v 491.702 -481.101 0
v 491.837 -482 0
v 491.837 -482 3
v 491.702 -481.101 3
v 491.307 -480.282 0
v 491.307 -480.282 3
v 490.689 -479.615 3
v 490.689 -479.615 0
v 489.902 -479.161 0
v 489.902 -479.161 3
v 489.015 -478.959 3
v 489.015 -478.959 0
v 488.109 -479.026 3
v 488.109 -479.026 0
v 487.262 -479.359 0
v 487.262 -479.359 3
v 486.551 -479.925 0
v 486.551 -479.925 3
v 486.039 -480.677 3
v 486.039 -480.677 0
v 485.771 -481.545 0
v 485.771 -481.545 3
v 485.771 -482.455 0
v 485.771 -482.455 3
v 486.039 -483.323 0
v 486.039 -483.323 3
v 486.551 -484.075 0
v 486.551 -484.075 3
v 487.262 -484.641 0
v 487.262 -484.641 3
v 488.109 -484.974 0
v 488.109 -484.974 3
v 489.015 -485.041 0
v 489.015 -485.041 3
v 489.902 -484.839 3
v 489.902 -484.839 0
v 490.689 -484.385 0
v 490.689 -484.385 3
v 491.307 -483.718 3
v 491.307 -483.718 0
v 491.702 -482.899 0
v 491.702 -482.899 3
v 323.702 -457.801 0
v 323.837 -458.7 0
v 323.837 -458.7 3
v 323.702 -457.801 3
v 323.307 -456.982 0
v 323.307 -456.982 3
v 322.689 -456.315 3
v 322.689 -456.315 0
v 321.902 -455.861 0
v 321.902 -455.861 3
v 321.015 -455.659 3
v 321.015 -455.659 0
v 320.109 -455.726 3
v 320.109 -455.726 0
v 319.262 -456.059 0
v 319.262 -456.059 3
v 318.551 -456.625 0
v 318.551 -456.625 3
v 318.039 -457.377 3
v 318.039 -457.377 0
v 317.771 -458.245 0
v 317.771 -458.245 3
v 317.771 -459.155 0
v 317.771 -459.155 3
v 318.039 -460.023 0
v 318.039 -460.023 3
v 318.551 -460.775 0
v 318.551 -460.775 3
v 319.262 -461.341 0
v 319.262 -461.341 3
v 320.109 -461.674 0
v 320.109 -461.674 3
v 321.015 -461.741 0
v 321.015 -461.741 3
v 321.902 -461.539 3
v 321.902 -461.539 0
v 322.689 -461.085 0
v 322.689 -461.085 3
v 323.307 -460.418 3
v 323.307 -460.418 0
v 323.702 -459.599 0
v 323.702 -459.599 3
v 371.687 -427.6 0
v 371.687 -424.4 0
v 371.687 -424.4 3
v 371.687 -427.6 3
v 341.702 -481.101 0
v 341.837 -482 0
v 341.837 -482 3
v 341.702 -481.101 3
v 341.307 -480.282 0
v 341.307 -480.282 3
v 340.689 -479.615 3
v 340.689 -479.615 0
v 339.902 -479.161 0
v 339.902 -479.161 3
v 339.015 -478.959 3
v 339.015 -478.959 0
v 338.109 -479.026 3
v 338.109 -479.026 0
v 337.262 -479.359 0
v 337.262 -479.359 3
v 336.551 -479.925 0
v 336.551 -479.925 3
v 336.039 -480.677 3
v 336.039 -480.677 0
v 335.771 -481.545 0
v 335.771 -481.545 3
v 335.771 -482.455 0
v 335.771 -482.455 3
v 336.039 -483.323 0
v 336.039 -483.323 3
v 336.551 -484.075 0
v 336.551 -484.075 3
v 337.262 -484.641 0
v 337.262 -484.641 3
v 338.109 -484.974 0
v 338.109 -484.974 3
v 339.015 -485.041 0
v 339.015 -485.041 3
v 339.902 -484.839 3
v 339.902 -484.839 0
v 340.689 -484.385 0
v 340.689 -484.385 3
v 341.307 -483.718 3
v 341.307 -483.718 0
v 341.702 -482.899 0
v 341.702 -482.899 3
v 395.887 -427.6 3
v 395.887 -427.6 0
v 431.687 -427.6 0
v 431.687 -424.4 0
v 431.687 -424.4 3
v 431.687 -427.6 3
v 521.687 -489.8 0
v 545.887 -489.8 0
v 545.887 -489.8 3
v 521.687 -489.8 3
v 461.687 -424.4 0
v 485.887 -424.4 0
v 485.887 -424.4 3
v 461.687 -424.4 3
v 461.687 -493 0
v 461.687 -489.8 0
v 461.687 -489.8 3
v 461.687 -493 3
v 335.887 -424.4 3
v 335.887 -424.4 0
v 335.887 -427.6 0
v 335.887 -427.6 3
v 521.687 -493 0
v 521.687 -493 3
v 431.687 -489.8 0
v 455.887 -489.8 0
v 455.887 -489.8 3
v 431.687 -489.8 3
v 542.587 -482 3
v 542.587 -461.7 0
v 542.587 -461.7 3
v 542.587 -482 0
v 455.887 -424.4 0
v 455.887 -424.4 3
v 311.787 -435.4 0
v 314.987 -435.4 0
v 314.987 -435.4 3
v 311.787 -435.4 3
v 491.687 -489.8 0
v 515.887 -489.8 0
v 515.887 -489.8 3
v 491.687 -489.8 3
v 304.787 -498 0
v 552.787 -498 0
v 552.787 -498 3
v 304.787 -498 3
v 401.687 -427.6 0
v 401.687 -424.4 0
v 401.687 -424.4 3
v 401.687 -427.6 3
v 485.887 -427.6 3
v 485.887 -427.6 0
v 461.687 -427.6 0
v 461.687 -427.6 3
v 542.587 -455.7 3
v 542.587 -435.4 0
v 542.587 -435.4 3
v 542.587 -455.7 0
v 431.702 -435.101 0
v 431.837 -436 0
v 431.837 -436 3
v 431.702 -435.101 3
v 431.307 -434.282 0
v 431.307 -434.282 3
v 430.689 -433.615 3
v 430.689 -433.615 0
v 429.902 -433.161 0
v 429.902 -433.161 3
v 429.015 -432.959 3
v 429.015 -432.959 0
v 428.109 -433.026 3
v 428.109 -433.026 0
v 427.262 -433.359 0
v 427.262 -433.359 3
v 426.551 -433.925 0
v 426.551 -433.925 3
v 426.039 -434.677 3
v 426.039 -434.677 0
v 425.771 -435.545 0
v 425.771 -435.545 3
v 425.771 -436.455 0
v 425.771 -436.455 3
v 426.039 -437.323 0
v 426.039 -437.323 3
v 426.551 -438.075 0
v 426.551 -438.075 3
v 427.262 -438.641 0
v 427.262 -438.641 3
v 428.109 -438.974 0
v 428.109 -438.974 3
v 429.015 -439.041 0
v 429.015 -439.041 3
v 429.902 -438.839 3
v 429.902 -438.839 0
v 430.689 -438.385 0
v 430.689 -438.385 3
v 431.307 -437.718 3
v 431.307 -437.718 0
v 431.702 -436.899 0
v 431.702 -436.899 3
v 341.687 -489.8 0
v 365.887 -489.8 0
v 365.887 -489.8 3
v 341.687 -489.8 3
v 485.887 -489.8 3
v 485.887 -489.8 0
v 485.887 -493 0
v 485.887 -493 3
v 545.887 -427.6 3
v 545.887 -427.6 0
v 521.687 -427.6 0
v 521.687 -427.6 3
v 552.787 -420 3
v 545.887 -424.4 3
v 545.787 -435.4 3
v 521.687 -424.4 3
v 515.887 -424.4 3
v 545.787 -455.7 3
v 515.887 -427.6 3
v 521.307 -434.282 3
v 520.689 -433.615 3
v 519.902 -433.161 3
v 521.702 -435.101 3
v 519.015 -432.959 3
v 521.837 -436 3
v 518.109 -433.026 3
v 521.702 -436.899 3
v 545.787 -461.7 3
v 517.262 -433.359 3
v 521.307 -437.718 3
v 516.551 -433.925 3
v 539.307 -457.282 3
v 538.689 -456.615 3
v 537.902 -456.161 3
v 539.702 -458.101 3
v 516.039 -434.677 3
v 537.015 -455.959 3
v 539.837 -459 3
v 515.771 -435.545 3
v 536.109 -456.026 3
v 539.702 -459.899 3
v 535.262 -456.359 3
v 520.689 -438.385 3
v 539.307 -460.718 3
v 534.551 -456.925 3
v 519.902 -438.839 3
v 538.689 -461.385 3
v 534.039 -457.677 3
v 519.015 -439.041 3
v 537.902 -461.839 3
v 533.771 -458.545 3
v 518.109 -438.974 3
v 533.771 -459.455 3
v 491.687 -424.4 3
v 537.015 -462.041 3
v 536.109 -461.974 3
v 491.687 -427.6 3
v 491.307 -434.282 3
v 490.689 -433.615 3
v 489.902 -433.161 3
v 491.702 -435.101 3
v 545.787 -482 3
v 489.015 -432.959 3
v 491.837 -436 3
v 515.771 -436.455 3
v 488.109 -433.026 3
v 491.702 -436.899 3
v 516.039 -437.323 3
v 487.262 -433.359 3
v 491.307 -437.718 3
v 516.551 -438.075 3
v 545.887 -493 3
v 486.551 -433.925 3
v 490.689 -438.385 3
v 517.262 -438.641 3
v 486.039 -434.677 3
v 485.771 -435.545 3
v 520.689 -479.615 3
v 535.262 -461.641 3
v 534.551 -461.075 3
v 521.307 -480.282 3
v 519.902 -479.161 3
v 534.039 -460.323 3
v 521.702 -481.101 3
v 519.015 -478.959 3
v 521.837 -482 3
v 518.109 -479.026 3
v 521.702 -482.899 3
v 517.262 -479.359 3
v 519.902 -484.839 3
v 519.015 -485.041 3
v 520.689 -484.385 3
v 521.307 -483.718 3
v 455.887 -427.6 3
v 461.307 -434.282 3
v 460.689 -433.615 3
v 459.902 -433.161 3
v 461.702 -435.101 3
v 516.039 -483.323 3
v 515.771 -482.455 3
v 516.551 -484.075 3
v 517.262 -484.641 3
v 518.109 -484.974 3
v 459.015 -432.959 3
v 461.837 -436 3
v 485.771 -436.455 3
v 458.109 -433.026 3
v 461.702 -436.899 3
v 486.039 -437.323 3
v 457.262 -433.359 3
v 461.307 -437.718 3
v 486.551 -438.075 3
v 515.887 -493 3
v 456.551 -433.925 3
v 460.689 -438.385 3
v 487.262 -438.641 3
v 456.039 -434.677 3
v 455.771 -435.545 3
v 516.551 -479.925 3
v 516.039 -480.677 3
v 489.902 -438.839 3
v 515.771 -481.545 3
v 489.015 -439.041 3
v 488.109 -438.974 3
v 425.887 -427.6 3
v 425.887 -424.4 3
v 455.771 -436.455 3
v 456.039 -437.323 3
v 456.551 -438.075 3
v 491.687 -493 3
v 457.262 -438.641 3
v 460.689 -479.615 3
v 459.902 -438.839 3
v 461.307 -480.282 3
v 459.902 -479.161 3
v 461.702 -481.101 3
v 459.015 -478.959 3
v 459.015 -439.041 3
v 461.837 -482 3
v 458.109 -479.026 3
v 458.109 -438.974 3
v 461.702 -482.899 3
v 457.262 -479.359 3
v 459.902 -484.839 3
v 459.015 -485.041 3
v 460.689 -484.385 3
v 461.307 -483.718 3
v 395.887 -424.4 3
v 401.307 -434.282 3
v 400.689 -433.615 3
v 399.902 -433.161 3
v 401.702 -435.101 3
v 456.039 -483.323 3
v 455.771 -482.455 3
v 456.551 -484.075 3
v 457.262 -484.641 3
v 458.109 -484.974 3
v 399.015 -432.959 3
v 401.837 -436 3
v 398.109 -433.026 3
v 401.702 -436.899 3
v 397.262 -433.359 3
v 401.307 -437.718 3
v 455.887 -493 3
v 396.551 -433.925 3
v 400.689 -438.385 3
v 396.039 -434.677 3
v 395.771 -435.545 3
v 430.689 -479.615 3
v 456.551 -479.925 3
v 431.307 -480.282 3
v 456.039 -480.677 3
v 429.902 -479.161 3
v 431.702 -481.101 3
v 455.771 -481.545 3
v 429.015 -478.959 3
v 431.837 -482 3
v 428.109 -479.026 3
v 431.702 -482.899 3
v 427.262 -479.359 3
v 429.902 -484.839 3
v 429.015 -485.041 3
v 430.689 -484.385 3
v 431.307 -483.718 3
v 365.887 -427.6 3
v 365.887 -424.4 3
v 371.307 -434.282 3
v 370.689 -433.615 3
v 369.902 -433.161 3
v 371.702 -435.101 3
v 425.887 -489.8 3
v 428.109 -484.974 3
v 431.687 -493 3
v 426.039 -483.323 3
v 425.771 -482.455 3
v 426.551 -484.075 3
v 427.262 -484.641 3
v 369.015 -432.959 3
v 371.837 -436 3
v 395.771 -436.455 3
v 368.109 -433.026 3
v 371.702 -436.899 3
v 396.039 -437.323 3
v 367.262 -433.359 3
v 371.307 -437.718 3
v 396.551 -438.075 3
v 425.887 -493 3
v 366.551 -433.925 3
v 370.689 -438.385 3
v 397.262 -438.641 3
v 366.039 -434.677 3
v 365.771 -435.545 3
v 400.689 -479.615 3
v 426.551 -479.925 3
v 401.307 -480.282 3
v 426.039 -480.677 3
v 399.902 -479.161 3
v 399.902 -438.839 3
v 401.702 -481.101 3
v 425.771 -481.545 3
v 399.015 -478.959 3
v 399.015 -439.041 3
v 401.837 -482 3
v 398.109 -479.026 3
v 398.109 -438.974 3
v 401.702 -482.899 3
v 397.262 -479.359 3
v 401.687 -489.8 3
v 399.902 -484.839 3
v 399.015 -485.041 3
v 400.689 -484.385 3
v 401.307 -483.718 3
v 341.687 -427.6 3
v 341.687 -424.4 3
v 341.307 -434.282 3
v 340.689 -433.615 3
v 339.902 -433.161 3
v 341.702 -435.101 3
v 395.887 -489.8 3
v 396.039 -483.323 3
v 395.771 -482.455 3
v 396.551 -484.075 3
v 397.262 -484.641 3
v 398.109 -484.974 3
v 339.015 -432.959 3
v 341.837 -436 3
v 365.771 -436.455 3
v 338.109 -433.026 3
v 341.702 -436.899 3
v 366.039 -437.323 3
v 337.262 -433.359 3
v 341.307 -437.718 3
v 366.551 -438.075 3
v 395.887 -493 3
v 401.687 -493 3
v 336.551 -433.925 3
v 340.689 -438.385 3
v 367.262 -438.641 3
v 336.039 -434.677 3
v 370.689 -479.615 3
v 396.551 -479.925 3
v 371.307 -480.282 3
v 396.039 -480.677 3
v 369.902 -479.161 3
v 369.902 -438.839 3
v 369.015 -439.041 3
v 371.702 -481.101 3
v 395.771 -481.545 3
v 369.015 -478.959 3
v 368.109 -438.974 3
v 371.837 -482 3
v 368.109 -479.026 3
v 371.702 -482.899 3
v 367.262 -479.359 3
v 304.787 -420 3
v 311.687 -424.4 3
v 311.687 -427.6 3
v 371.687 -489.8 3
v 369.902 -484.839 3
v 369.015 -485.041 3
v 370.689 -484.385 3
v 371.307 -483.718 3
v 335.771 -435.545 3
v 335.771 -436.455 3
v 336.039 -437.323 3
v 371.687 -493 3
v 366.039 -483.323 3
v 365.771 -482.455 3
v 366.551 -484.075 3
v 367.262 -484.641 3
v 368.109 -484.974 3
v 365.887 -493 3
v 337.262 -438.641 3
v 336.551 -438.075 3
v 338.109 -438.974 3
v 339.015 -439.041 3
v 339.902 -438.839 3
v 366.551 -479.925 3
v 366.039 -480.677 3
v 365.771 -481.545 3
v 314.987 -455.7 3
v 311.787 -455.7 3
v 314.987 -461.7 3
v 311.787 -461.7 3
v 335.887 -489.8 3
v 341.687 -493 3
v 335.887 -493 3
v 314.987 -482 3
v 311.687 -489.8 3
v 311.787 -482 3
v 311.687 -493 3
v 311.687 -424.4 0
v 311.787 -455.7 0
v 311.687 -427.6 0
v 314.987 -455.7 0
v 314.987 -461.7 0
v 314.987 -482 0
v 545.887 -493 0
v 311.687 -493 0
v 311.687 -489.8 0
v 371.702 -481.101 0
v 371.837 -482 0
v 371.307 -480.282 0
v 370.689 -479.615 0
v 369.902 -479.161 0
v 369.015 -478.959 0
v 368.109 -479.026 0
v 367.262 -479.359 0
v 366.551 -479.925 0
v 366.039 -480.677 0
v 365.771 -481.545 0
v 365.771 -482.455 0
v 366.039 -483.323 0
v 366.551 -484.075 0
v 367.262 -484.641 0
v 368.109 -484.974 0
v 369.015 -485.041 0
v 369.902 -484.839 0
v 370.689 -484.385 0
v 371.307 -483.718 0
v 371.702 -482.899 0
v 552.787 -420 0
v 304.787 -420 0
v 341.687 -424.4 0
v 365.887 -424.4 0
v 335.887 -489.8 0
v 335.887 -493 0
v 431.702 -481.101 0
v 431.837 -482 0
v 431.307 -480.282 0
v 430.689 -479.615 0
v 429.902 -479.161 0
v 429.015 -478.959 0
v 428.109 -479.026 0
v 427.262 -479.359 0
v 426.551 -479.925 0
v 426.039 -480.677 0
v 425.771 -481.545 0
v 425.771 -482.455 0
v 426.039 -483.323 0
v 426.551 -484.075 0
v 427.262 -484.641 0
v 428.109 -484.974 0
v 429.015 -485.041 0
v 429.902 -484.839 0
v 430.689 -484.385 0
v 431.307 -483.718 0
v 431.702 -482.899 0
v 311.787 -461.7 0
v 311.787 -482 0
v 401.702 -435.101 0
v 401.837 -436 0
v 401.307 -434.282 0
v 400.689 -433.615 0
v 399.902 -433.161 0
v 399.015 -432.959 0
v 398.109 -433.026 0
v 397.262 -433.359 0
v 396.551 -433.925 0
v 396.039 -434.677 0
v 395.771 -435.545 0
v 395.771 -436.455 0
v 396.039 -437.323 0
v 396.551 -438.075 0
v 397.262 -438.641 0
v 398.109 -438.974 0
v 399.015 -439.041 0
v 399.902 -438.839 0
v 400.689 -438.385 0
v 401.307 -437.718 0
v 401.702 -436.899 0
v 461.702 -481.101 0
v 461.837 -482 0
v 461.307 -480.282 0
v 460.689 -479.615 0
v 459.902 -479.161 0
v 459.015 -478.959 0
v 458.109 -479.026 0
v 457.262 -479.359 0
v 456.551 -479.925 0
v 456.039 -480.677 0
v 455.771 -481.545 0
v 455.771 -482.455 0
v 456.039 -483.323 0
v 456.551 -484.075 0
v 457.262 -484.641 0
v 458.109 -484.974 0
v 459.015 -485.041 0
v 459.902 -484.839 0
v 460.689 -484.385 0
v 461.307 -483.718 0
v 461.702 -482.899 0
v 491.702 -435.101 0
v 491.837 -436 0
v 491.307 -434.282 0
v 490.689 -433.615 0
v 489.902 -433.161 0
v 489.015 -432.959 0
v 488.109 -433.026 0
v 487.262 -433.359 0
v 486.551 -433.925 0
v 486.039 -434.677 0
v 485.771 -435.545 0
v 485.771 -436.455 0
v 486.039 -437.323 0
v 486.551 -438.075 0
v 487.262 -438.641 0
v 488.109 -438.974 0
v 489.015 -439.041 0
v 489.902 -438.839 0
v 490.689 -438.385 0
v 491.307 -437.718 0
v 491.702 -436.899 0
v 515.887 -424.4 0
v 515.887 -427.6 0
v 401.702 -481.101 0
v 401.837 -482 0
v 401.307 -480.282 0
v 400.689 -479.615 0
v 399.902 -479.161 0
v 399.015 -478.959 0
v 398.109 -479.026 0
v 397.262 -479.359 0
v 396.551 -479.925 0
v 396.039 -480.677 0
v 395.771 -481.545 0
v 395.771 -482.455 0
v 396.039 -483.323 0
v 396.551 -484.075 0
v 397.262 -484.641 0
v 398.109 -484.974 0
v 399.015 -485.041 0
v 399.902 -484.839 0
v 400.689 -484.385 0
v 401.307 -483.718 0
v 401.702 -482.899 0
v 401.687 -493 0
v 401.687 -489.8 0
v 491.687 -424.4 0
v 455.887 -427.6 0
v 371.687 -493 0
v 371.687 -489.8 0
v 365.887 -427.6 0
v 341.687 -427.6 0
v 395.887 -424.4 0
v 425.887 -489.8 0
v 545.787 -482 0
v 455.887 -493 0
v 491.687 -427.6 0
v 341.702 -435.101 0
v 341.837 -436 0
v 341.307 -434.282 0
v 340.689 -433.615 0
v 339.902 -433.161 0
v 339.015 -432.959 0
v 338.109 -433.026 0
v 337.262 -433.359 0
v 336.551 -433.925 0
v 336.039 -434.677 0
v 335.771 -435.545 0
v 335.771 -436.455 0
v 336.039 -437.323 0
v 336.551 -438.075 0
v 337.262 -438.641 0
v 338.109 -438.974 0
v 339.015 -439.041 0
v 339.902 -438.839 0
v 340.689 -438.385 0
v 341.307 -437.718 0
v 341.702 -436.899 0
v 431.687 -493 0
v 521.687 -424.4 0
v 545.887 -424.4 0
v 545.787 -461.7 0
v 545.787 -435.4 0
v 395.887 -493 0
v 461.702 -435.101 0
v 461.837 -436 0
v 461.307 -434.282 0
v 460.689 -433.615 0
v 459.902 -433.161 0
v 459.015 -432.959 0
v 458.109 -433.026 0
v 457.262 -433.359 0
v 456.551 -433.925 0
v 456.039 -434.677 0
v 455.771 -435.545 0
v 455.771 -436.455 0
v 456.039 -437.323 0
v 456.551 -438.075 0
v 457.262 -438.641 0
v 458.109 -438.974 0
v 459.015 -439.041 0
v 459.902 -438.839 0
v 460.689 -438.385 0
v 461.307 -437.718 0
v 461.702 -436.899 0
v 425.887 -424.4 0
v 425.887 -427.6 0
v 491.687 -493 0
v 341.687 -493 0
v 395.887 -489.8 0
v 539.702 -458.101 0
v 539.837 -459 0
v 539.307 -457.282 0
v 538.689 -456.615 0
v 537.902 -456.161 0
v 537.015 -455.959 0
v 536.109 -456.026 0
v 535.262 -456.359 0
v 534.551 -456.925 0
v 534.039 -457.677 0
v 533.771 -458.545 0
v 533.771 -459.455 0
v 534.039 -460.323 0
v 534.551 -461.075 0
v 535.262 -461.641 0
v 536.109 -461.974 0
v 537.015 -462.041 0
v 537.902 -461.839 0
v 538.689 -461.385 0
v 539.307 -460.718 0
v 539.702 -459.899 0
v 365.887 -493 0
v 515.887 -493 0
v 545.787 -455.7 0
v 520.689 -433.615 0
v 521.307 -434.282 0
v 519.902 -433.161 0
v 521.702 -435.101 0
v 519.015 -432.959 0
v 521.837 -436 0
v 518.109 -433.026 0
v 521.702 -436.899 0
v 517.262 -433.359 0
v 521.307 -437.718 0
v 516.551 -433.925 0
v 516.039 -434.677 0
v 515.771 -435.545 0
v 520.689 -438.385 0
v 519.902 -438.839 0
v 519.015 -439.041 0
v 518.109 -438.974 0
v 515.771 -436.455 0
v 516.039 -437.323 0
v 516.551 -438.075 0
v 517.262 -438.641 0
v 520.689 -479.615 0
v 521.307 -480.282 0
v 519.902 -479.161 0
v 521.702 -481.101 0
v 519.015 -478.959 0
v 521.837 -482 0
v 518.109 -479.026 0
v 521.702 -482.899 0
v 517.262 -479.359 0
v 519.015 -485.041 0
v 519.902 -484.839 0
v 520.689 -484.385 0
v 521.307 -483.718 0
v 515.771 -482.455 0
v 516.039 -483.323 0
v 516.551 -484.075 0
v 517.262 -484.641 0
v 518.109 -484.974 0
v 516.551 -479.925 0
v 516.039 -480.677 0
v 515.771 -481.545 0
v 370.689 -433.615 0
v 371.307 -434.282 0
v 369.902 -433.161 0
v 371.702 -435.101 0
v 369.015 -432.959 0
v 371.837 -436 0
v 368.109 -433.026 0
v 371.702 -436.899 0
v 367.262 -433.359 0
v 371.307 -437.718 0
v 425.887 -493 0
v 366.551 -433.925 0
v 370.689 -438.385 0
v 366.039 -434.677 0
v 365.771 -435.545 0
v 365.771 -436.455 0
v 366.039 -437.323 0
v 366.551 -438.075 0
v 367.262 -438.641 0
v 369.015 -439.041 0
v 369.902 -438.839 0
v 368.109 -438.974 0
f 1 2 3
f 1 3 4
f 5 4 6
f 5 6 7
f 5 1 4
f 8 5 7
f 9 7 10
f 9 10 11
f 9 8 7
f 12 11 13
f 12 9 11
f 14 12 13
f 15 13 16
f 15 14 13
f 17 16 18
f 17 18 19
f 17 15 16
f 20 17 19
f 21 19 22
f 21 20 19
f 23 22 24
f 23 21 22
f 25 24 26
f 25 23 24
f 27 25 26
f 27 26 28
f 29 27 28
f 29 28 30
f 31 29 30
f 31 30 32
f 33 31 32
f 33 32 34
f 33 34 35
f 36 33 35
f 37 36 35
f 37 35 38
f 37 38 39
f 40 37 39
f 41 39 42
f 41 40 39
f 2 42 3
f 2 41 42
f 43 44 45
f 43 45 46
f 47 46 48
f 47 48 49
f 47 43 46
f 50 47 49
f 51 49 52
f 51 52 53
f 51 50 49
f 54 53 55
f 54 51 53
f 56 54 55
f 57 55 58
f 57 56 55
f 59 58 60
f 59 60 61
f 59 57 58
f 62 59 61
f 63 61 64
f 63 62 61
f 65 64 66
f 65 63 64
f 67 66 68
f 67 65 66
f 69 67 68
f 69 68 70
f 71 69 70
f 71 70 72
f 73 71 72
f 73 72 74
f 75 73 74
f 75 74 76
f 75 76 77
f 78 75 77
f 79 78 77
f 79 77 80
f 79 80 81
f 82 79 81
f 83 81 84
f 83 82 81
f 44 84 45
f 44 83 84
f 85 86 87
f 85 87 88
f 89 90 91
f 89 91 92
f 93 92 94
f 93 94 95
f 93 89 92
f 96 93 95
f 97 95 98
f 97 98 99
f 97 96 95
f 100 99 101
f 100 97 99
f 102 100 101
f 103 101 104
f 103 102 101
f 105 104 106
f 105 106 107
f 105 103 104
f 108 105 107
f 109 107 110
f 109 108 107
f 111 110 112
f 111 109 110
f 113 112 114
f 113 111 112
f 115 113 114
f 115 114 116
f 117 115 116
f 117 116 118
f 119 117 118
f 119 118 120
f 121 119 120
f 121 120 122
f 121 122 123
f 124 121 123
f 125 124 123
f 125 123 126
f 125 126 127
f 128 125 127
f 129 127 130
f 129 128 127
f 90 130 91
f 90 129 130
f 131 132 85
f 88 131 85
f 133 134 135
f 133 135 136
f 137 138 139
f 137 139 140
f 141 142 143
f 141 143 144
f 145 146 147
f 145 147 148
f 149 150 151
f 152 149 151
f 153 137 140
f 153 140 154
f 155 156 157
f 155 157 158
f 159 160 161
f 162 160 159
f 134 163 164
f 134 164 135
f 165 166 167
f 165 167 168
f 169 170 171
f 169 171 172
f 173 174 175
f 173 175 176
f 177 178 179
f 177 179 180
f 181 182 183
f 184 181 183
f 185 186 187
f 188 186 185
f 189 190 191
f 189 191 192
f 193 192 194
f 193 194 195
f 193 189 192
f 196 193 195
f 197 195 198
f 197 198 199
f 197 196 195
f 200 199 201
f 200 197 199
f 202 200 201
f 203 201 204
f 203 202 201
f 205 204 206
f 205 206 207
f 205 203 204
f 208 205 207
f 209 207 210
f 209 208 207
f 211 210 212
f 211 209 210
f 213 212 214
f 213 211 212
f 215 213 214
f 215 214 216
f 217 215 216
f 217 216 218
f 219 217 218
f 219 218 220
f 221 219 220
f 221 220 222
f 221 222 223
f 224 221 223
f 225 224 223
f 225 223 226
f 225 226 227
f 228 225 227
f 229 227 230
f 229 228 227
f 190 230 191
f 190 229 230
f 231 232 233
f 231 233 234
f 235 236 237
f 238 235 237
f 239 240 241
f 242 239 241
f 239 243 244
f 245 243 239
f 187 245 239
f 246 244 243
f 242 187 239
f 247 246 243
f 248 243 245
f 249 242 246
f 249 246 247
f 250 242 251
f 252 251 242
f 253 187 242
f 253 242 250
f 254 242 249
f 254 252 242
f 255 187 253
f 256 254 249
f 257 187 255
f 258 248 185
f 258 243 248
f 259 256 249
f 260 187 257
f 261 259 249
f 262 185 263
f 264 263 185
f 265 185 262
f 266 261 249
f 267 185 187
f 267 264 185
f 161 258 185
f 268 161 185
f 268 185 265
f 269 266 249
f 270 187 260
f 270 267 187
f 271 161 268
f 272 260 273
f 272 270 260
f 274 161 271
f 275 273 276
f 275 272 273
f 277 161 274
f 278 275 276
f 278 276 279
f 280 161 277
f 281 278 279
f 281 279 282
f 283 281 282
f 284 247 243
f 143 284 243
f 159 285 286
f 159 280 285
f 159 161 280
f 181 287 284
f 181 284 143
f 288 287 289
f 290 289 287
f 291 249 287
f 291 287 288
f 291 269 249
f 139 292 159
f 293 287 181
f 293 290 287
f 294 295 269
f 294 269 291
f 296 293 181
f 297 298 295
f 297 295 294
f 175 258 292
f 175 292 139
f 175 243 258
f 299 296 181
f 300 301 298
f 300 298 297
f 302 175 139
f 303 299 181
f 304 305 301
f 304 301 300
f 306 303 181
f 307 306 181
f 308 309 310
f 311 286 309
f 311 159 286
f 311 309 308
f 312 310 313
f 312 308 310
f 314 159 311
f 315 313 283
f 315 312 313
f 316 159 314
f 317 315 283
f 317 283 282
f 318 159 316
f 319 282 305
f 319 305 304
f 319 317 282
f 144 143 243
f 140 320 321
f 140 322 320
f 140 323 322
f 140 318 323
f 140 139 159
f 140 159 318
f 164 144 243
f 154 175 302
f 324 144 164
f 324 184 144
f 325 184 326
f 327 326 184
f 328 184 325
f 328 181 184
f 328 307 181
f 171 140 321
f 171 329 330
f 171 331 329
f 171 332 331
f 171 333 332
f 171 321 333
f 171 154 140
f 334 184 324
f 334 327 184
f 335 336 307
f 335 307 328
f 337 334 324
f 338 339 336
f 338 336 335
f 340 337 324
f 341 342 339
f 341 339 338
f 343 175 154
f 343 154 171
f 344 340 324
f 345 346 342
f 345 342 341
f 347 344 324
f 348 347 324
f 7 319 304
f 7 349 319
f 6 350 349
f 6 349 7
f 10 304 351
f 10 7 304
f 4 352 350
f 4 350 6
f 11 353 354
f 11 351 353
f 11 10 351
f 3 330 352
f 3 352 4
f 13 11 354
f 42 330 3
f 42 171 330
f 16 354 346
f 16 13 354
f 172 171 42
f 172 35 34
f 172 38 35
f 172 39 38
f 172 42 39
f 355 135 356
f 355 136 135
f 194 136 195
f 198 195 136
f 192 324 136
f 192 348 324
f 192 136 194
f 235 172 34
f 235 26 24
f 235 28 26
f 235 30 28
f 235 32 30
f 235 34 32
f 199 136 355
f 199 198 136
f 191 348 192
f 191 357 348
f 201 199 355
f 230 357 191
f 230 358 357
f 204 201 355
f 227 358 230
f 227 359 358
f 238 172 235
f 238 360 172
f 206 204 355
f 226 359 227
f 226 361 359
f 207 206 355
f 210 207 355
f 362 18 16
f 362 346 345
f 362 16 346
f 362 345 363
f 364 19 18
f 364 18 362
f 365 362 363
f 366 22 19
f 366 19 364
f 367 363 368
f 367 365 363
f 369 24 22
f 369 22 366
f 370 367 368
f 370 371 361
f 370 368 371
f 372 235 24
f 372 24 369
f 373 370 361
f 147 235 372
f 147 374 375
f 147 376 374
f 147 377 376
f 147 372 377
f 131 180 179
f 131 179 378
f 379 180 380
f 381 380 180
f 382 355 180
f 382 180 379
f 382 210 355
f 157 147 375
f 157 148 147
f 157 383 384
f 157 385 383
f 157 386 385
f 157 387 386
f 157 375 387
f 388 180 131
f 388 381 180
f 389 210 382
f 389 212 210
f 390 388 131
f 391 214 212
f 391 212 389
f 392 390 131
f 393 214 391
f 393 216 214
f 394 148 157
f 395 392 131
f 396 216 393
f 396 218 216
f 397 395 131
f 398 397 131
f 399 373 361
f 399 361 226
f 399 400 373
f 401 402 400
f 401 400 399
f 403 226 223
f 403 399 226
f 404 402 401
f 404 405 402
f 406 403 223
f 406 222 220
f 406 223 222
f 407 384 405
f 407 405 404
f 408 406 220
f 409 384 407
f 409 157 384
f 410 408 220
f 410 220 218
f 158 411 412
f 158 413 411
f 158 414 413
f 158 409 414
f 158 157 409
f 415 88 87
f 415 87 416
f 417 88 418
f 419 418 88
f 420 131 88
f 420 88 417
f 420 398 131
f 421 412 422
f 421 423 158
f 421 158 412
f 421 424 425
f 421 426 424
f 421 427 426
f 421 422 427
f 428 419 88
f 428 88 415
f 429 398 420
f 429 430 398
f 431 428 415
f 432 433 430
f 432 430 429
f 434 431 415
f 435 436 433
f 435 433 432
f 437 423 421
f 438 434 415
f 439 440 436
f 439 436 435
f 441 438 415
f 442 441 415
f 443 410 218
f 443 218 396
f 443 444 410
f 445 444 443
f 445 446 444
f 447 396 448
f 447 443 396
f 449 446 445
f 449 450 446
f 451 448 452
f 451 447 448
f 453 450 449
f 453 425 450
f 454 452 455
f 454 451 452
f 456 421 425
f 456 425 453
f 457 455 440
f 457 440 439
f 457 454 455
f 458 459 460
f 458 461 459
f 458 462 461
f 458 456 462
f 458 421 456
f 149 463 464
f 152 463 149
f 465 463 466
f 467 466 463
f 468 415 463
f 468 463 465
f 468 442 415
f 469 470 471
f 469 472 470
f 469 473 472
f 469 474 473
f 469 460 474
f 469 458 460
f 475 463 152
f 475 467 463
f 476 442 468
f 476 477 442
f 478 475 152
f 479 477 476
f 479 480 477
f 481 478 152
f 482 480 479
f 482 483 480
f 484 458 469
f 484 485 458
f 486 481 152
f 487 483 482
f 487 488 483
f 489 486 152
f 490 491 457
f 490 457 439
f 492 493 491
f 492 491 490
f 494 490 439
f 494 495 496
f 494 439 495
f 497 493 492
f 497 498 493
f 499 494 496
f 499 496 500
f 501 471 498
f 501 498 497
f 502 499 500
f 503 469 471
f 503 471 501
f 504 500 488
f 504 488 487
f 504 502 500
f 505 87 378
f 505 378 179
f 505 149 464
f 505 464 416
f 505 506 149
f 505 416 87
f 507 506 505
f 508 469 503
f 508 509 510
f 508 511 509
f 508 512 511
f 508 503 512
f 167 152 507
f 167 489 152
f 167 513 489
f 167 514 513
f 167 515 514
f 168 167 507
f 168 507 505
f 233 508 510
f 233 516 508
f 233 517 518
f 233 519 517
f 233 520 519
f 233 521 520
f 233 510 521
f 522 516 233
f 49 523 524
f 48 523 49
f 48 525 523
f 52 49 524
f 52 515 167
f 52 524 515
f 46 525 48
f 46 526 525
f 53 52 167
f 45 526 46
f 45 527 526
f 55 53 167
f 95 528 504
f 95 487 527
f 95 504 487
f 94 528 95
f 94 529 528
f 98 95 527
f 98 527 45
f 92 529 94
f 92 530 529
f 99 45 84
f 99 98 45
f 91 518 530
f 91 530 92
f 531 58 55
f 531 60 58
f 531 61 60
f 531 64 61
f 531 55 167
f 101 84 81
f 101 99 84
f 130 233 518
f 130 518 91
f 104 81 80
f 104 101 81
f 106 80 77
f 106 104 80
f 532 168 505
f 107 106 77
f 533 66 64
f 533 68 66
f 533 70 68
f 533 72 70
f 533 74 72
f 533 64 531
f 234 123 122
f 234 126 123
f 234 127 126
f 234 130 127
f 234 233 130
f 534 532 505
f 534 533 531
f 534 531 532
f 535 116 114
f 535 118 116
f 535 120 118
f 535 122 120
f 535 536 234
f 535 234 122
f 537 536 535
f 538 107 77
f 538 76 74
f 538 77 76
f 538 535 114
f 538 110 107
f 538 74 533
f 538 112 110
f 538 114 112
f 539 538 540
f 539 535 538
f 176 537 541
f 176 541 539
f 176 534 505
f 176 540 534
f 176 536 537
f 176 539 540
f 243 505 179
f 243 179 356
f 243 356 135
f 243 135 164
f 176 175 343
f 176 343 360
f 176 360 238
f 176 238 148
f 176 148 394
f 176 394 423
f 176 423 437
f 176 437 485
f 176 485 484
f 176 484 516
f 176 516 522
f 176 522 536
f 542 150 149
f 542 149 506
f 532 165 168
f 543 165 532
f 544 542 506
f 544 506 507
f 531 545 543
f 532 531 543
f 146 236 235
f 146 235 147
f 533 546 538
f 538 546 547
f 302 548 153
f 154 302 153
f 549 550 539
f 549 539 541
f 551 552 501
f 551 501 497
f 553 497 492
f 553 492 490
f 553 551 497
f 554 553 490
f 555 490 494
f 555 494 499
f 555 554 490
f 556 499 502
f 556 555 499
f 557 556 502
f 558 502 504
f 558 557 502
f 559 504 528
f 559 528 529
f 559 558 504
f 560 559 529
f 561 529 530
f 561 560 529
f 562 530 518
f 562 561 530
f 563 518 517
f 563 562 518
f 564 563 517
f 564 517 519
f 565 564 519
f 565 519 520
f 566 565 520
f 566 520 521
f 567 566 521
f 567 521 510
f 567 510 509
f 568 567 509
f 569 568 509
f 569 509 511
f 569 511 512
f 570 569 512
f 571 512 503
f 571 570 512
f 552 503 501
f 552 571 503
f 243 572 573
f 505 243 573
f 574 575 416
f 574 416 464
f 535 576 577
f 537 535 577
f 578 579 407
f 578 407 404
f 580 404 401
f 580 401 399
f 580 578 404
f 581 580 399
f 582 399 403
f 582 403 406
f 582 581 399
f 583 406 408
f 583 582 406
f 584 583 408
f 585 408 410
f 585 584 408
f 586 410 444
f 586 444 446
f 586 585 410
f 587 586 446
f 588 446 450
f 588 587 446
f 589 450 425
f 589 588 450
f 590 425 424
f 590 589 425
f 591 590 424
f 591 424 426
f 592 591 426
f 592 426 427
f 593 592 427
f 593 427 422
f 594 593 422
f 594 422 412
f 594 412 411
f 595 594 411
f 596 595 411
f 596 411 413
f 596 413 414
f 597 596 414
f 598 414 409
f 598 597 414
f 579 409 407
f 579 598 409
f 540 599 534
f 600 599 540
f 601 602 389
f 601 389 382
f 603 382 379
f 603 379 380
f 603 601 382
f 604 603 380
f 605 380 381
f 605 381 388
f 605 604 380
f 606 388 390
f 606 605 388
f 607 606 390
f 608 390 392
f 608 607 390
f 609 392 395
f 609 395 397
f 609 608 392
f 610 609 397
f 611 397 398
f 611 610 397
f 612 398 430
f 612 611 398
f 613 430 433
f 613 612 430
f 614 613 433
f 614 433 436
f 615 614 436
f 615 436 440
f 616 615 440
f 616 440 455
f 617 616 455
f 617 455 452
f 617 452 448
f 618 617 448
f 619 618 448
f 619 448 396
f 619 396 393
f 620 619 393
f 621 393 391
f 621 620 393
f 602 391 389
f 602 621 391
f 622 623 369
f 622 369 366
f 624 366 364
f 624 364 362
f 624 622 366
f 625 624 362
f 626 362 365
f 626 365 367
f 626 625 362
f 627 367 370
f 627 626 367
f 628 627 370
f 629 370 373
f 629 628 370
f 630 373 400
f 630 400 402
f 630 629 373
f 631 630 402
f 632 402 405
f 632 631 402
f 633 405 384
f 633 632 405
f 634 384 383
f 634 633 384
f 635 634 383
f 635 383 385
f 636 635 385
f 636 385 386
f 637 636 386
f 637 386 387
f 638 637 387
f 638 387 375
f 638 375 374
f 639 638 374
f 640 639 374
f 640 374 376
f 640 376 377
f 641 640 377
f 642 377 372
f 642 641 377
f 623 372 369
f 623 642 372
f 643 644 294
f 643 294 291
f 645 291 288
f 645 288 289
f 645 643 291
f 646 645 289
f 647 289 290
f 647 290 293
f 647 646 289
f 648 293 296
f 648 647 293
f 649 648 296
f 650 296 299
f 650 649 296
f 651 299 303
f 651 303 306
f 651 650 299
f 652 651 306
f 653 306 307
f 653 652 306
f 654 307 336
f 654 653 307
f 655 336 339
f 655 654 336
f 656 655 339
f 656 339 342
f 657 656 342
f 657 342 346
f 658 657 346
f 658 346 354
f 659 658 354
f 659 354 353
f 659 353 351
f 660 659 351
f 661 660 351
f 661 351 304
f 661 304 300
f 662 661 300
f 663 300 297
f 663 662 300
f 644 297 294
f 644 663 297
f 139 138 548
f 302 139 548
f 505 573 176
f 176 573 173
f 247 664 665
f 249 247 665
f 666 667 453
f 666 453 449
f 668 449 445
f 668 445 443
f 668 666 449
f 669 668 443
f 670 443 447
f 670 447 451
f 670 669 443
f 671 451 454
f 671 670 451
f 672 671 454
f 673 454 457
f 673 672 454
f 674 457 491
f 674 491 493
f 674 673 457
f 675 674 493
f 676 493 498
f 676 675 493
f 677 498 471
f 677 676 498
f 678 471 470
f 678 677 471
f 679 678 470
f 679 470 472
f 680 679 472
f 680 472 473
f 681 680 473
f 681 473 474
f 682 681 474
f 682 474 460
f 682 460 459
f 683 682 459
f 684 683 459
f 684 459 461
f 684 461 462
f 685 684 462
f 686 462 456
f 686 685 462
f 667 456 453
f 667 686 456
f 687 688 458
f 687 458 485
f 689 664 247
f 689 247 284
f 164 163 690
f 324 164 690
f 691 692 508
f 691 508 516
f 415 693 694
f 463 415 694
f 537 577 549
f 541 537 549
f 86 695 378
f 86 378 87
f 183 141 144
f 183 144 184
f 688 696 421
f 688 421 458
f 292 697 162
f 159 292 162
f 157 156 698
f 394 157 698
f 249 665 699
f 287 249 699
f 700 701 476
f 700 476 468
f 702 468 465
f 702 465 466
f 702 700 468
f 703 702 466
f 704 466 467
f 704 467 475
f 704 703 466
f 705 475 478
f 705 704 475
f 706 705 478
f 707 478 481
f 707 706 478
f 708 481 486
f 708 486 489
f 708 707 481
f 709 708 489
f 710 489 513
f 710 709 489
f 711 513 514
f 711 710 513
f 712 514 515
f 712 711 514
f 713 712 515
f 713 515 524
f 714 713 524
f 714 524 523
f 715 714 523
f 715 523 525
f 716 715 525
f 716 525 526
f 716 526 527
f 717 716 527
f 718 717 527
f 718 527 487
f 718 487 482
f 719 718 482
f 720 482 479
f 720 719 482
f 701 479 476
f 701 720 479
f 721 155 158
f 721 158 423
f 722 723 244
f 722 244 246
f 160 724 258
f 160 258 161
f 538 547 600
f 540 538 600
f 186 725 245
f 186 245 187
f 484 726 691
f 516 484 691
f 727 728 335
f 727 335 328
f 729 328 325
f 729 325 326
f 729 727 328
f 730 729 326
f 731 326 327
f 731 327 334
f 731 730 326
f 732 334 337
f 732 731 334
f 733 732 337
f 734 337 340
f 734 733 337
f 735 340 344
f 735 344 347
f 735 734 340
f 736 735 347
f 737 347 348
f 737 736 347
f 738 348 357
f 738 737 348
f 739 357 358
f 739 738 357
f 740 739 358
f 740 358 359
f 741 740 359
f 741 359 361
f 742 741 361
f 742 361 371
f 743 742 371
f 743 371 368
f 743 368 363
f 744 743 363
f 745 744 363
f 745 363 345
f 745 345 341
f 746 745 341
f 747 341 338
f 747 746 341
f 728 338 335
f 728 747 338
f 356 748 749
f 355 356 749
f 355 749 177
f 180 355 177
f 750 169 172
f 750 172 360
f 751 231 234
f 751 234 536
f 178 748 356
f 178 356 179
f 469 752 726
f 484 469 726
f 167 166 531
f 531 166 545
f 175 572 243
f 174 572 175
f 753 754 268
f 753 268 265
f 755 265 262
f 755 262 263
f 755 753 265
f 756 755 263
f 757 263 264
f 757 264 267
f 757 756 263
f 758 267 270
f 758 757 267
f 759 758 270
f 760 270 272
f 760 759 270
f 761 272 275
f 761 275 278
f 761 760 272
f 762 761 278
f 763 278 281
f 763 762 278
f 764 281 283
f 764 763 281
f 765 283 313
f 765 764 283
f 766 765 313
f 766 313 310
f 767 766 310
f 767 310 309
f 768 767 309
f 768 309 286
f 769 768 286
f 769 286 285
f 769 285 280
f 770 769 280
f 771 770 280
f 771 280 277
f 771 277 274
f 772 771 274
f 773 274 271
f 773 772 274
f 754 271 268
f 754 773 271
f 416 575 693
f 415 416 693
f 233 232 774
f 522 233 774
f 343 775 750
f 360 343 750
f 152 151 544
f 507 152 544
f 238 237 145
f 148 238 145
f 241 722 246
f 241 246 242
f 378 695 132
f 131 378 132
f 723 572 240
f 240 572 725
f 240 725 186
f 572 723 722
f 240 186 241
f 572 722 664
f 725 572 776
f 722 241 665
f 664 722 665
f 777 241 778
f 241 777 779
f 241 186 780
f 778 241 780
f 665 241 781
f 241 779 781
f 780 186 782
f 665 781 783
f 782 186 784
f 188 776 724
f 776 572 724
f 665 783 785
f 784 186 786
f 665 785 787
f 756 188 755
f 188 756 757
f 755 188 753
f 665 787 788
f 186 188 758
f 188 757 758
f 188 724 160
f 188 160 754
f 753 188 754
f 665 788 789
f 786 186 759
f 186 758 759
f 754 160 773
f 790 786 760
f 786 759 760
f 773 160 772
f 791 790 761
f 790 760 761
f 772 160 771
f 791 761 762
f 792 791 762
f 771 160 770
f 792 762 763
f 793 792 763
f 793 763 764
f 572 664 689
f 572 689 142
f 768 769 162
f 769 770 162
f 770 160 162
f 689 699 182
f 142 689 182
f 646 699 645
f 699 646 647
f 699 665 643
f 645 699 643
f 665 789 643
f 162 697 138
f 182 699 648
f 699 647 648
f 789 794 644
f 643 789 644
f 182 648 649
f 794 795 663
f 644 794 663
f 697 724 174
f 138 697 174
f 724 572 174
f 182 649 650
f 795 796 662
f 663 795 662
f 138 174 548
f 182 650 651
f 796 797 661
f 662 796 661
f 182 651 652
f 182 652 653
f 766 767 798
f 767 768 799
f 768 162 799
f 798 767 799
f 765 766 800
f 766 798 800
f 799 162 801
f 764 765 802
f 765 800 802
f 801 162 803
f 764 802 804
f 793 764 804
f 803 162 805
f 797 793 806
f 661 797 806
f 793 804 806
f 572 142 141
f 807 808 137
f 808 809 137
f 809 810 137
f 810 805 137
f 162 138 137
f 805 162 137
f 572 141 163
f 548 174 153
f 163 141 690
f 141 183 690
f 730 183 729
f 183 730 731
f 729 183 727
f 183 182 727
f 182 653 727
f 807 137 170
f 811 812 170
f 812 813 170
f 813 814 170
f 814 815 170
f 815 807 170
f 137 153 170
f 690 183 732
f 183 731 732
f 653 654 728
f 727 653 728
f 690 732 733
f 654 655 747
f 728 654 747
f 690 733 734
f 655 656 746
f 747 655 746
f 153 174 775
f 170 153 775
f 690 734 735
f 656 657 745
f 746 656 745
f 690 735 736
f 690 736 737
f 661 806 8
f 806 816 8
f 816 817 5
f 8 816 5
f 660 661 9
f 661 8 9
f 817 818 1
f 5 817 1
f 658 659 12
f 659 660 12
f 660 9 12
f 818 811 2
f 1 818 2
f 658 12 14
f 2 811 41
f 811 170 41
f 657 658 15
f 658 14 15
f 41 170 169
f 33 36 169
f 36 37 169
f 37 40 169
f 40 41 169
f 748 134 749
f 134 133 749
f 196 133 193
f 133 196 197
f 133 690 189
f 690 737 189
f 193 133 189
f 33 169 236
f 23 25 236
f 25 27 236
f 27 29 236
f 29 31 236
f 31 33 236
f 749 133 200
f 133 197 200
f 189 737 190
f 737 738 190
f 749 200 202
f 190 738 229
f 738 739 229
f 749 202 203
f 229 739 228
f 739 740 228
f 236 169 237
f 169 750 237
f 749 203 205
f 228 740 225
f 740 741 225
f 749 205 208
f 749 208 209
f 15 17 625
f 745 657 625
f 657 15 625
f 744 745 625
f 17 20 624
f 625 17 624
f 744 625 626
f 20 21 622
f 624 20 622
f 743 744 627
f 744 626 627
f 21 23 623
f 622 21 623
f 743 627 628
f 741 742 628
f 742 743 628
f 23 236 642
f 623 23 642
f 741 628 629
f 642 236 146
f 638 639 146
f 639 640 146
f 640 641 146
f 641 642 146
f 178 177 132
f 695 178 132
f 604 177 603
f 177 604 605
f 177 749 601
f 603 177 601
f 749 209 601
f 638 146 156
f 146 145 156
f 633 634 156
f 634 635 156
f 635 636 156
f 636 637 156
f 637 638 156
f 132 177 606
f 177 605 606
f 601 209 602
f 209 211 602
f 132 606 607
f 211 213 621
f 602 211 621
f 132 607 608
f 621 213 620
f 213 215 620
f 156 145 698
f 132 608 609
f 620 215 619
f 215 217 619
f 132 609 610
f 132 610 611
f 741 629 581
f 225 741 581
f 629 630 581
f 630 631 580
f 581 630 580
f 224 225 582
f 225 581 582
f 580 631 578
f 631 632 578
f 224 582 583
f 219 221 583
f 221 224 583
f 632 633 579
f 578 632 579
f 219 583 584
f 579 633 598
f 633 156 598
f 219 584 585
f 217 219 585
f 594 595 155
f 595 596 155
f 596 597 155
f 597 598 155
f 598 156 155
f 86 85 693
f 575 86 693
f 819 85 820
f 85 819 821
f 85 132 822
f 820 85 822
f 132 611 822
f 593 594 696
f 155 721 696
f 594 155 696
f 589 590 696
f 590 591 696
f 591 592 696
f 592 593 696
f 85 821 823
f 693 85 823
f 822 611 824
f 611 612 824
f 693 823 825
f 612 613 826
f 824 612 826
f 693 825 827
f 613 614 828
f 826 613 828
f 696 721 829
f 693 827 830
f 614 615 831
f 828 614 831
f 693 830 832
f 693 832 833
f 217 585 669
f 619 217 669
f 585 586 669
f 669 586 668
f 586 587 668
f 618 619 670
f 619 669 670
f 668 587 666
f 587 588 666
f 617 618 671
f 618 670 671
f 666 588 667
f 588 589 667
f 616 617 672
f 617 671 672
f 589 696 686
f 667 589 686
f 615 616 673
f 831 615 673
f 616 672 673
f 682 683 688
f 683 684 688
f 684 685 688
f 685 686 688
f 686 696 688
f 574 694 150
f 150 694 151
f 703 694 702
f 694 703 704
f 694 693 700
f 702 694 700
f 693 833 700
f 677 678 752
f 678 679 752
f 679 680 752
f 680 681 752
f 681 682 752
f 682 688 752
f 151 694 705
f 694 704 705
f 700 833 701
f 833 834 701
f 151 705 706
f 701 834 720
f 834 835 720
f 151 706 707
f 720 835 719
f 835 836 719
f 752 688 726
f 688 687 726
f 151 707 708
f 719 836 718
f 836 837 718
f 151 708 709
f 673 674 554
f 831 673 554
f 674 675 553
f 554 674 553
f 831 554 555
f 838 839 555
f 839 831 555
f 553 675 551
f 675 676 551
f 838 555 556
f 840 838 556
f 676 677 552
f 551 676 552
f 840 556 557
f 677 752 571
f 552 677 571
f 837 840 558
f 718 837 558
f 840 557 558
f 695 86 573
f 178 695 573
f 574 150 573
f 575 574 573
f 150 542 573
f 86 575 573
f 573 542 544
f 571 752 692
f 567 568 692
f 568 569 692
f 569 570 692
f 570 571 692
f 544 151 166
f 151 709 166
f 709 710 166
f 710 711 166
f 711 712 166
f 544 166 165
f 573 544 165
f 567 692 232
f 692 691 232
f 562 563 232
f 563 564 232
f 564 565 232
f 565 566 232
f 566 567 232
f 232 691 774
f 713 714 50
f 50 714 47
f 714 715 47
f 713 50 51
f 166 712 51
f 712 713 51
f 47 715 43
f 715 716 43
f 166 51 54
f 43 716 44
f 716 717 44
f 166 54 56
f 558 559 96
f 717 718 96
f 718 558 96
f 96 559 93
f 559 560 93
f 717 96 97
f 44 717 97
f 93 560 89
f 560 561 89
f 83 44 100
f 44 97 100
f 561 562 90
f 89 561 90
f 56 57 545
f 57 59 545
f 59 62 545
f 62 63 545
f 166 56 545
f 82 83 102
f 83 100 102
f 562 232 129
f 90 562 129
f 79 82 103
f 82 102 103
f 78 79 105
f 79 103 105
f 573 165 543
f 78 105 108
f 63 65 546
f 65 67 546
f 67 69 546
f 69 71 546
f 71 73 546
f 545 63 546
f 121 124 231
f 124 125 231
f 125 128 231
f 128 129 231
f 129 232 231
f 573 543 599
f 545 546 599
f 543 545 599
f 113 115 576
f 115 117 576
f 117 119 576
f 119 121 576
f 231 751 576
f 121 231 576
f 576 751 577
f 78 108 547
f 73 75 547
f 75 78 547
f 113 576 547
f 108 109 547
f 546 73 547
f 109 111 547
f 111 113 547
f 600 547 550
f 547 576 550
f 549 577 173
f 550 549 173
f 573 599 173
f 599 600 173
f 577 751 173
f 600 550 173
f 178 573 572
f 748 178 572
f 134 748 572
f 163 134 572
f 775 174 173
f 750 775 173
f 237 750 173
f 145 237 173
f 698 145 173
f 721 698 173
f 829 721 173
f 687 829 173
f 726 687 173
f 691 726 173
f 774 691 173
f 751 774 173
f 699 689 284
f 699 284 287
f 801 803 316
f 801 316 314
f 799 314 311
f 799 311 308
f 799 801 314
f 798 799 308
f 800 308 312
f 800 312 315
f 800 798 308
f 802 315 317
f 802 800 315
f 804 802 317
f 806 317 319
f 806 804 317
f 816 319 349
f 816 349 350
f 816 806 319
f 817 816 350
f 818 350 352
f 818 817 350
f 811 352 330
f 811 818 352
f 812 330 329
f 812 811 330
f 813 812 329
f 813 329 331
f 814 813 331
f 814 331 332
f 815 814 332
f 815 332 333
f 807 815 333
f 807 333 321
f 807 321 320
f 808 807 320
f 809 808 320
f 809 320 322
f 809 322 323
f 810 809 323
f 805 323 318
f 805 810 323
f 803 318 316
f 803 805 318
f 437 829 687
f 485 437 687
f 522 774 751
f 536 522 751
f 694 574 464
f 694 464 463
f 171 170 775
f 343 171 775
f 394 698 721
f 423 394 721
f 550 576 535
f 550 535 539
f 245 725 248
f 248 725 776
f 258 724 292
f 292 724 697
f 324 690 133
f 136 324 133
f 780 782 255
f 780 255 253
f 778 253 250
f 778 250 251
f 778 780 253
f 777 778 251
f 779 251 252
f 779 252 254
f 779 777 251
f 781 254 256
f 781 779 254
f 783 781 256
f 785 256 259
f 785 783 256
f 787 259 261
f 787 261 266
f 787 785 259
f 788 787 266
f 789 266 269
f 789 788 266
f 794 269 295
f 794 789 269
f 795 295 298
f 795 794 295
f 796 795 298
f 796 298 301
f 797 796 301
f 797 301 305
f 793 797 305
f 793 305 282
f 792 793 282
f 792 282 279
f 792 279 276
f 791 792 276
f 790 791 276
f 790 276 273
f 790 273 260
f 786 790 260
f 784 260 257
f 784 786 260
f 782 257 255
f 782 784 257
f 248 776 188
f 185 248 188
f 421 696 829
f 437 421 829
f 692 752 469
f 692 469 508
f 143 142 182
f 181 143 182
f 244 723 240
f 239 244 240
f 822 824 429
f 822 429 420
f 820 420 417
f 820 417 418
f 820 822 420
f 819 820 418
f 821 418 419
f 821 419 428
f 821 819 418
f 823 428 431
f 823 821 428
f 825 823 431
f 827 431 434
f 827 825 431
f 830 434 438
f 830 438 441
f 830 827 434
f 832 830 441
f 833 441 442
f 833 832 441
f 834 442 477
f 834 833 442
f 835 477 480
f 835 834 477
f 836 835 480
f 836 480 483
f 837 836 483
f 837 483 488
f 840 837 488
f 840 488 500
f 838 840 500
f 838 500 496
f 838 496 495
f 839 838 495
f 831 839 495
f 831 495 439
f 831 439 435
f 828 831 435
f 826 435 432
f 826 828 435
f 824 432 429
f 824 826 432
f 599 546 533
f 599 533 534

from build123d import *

# Parameters (mm, degrees)
SKETCH1_W           = 248
SKETCH1_H           = 78
SKETCH1_R           = 3.05
SKETCH1_W_2         = 24.2
SKETCH1_H_2         = 3.2
SKETCH1_W_3         = 3.2
SKETCH1_H_3         = 20.3
BOSS_EXTRUDE2_DEPTH = 3


with BuildPart() as part:
    # Sketch1 → Boss-Extrude2 (new body)
    with BuildSketch(Plane(origin=(0, 0, 0), x_dir=(-1, 0, 0), z_dir=(0, 0, 1))):
        with Locations((-428.787224347, 459)):
            Rectangle(SKETCH1_W, SKETCH1_H)
        with Locations(Location((-338.787224347, 436, 0), (0, 0, 180))):
            Circle(SKETCH1_R, mode=Mode.SUBTRACT)
        with Locations(Location((-368.787224347, 436, 0), (0, 0, 180))):
            Circle(SKETCH1_R, mode=Mode.SUBTRACT)
        with Locations(Location((-428.787224347, 436, 0), (0, 0, 180))):
            Circle(SKETCH1_R, mode=Mode.SUBTRACT)
        with Locations(Location((-398.787224347, 436, 0), (0, 0, 180))):
            Circle(SKETCH1_R, mode=Mode.SUBTRACT)
        with Locations(Location((-488.787224347, 436, 0), (0, 0, 180))):
            Circle(SKETCH1_R, mode=Mode.SUBTRACT)
        with Locations(Location((-458.787224347, 436, 0), (0, 0, 180))):
            Circle(SKETCH1_R, mode=Mode.SUBTRACT)
        with Locations(Location((-458.787224347, 482, 0), (0, 0, 180))):
            Circle(SKETCH1_R, mode=Mode.SUBTRACT)
        with Locations(Location((-428.787224347, 482, 0), (0, 0, 180))):
            Circle(SKETCH1_R, mode=Mode.SUBTRACT)
        with Locations(Location((-398.787224347, 482, 0), (0, 0, 180))):
            Circle(SKETCH1_R, mode=Mode.SUBTRACT)
        with Locations(Location((-368.787224347, 482, 0), (0, 0, 180))):
            Circle(SKETCH1_R, mode=Mode.SUBTRACT)
        with Locations(Location((-338.787224347, 482, 0), (0, 0, 180))):
            Circle(SKETCH1_R, mode=Mode.SUBTRACT)
        with Locations(Location((-320.787224347, 458.7, 0), (0, 0, 180))):
            Circle(SKETCH1_R, mode=Mode.SUBTRACT)
        with Locations(Location((-488.787224347, 482, 0), (0, 0, 180))):
            Circle(SKETCH1_R, mode=Mode.SUBTRACT)
        with Locations(Location((-518.787224347, 436, 0), (0, 0, 180))):
            Circle(SKETCH1_R, mode=Mode.SUBTRACT)
        with Locations(Location((-536.787224347, 459, 0), (0, 0, 180))):
            Circle(SKETCH1_R, mode=Mode.SUBTRACT)
        with Locations(Location((-518.787224347, 482, 0), (0, 0, 180))):
            Circle(SKETCH1_R, mode=Mode.SUBTRACT)
        with Locations((-383.787224347, 491.4)):
            Rectangle(SKETCH1_W_2, SKETCH1_H_2, mode=Mode.SUBTRACT)
        with Locations((-413.787224347, 491.4)):
            Rectangle(SKETCH1_W_2, SKETCH1_H_2, mode=Mode.SUBTRACT)
        with Locations((-353.787224347, 491.4)):
            Rectangle(SKETCH1_W_2, SKETCH1_H_2, mode=Mode.SUBTRACT)
        with Locations((-443.787224347, 491.4)):
            Rectangle(SKETCH1_W_2, SKETCH1_H_2, mode=Mode.SUBTRACT)
        with Locations((-473.787224347, 491.4)):
            Rectangle(SKETCH1_W_2, SKETCH1_H_2, mode=Mode.SUBTRACT)
        with Locations((-503.787224347, 491.4)):
            Rectangle(SKETCH1_W_2, SKETCH1_H_2, mode=Mode.SUBTRACT)
        with Locations((-533.787224347, 491.4)):
            Rectangle(SKETCH1_W_2, SKETCH1_H_2, mode=Mode.SUBTRACT)
        with Locations((-323.787224347, 491.4)):
            Rectangle(SKETCH1_W_2, SKETCH1_H_2, mode=Mode.SUBTRACT)
        with Locations((-313.387224347, 445.55)):
            Rectangle(SKETCH1_W_3, SKETCH1_H_3, mode=Mode.SUBTRACT)
        with Locations((-313.387224347, 471.85)):
            Rectangle(SKETCH1_W_3, SKETCH1_H_3, mode=Mode.SUBTRACT)
        with Locations((-544.187224347, 445.55)):
            Rectangle(SKETCH1_W_3, SKETCH1_H_3, mode=Mode.SUBTRACT)
        with Locations((-544.187224347, 471.85)):
            Rectangle(SKETCH1_W_3, SKETCH1_H_3, mode=Mode.SUBTRACT)
        with Locations((-533.787224347, 426)):
            Rectangle(SKETCH1_W_2, SKETCH1_H_2, mode=Mode.SUBTRACT)
        with Locations((-503.787224347, 426)):
            Rectangle(SKETCH1_W_2, SKETCH1_H_2, mode=Mode.SUBTRACT)
        with Locations((-473.787224347, 426)):
            Rectangle(SKETCH1_W_2, SKETCH1_H_2, mode=Mode.SUBTRACT)
        with Locations((-443.787224347, 426)):
            Rectangle(SKETCH1_W_2, SKETCH1_H_2, mode=Mode.SUBTRACT)
        with Locations((-413.787224347, 426)):
            Rectangle(SKETCH1_W_2, SKETCH1_H_2, mode=Mode.SUBTRACT)
        with Locations((-383.787224347, 426)):
            Rectangle(SKETCH1_W_2, SKETCH1_H_2, mode=Mode.SUBTRACT)
        with Locations((-353.787224347, 426)):
            Rectangle(SKETCH1_W_2, SKETCH1_H_2, mode=Mode.SUBTRACT)
        with Locations((-323.787224347, 426)):
            Rectangle(SKETCH1_W_2, SKETCH1_H_2, mode=Mode.SUBTRACT)
    extrude(amount=BOSS_EXTRUDE2_DEPTH)


solid = part.part
